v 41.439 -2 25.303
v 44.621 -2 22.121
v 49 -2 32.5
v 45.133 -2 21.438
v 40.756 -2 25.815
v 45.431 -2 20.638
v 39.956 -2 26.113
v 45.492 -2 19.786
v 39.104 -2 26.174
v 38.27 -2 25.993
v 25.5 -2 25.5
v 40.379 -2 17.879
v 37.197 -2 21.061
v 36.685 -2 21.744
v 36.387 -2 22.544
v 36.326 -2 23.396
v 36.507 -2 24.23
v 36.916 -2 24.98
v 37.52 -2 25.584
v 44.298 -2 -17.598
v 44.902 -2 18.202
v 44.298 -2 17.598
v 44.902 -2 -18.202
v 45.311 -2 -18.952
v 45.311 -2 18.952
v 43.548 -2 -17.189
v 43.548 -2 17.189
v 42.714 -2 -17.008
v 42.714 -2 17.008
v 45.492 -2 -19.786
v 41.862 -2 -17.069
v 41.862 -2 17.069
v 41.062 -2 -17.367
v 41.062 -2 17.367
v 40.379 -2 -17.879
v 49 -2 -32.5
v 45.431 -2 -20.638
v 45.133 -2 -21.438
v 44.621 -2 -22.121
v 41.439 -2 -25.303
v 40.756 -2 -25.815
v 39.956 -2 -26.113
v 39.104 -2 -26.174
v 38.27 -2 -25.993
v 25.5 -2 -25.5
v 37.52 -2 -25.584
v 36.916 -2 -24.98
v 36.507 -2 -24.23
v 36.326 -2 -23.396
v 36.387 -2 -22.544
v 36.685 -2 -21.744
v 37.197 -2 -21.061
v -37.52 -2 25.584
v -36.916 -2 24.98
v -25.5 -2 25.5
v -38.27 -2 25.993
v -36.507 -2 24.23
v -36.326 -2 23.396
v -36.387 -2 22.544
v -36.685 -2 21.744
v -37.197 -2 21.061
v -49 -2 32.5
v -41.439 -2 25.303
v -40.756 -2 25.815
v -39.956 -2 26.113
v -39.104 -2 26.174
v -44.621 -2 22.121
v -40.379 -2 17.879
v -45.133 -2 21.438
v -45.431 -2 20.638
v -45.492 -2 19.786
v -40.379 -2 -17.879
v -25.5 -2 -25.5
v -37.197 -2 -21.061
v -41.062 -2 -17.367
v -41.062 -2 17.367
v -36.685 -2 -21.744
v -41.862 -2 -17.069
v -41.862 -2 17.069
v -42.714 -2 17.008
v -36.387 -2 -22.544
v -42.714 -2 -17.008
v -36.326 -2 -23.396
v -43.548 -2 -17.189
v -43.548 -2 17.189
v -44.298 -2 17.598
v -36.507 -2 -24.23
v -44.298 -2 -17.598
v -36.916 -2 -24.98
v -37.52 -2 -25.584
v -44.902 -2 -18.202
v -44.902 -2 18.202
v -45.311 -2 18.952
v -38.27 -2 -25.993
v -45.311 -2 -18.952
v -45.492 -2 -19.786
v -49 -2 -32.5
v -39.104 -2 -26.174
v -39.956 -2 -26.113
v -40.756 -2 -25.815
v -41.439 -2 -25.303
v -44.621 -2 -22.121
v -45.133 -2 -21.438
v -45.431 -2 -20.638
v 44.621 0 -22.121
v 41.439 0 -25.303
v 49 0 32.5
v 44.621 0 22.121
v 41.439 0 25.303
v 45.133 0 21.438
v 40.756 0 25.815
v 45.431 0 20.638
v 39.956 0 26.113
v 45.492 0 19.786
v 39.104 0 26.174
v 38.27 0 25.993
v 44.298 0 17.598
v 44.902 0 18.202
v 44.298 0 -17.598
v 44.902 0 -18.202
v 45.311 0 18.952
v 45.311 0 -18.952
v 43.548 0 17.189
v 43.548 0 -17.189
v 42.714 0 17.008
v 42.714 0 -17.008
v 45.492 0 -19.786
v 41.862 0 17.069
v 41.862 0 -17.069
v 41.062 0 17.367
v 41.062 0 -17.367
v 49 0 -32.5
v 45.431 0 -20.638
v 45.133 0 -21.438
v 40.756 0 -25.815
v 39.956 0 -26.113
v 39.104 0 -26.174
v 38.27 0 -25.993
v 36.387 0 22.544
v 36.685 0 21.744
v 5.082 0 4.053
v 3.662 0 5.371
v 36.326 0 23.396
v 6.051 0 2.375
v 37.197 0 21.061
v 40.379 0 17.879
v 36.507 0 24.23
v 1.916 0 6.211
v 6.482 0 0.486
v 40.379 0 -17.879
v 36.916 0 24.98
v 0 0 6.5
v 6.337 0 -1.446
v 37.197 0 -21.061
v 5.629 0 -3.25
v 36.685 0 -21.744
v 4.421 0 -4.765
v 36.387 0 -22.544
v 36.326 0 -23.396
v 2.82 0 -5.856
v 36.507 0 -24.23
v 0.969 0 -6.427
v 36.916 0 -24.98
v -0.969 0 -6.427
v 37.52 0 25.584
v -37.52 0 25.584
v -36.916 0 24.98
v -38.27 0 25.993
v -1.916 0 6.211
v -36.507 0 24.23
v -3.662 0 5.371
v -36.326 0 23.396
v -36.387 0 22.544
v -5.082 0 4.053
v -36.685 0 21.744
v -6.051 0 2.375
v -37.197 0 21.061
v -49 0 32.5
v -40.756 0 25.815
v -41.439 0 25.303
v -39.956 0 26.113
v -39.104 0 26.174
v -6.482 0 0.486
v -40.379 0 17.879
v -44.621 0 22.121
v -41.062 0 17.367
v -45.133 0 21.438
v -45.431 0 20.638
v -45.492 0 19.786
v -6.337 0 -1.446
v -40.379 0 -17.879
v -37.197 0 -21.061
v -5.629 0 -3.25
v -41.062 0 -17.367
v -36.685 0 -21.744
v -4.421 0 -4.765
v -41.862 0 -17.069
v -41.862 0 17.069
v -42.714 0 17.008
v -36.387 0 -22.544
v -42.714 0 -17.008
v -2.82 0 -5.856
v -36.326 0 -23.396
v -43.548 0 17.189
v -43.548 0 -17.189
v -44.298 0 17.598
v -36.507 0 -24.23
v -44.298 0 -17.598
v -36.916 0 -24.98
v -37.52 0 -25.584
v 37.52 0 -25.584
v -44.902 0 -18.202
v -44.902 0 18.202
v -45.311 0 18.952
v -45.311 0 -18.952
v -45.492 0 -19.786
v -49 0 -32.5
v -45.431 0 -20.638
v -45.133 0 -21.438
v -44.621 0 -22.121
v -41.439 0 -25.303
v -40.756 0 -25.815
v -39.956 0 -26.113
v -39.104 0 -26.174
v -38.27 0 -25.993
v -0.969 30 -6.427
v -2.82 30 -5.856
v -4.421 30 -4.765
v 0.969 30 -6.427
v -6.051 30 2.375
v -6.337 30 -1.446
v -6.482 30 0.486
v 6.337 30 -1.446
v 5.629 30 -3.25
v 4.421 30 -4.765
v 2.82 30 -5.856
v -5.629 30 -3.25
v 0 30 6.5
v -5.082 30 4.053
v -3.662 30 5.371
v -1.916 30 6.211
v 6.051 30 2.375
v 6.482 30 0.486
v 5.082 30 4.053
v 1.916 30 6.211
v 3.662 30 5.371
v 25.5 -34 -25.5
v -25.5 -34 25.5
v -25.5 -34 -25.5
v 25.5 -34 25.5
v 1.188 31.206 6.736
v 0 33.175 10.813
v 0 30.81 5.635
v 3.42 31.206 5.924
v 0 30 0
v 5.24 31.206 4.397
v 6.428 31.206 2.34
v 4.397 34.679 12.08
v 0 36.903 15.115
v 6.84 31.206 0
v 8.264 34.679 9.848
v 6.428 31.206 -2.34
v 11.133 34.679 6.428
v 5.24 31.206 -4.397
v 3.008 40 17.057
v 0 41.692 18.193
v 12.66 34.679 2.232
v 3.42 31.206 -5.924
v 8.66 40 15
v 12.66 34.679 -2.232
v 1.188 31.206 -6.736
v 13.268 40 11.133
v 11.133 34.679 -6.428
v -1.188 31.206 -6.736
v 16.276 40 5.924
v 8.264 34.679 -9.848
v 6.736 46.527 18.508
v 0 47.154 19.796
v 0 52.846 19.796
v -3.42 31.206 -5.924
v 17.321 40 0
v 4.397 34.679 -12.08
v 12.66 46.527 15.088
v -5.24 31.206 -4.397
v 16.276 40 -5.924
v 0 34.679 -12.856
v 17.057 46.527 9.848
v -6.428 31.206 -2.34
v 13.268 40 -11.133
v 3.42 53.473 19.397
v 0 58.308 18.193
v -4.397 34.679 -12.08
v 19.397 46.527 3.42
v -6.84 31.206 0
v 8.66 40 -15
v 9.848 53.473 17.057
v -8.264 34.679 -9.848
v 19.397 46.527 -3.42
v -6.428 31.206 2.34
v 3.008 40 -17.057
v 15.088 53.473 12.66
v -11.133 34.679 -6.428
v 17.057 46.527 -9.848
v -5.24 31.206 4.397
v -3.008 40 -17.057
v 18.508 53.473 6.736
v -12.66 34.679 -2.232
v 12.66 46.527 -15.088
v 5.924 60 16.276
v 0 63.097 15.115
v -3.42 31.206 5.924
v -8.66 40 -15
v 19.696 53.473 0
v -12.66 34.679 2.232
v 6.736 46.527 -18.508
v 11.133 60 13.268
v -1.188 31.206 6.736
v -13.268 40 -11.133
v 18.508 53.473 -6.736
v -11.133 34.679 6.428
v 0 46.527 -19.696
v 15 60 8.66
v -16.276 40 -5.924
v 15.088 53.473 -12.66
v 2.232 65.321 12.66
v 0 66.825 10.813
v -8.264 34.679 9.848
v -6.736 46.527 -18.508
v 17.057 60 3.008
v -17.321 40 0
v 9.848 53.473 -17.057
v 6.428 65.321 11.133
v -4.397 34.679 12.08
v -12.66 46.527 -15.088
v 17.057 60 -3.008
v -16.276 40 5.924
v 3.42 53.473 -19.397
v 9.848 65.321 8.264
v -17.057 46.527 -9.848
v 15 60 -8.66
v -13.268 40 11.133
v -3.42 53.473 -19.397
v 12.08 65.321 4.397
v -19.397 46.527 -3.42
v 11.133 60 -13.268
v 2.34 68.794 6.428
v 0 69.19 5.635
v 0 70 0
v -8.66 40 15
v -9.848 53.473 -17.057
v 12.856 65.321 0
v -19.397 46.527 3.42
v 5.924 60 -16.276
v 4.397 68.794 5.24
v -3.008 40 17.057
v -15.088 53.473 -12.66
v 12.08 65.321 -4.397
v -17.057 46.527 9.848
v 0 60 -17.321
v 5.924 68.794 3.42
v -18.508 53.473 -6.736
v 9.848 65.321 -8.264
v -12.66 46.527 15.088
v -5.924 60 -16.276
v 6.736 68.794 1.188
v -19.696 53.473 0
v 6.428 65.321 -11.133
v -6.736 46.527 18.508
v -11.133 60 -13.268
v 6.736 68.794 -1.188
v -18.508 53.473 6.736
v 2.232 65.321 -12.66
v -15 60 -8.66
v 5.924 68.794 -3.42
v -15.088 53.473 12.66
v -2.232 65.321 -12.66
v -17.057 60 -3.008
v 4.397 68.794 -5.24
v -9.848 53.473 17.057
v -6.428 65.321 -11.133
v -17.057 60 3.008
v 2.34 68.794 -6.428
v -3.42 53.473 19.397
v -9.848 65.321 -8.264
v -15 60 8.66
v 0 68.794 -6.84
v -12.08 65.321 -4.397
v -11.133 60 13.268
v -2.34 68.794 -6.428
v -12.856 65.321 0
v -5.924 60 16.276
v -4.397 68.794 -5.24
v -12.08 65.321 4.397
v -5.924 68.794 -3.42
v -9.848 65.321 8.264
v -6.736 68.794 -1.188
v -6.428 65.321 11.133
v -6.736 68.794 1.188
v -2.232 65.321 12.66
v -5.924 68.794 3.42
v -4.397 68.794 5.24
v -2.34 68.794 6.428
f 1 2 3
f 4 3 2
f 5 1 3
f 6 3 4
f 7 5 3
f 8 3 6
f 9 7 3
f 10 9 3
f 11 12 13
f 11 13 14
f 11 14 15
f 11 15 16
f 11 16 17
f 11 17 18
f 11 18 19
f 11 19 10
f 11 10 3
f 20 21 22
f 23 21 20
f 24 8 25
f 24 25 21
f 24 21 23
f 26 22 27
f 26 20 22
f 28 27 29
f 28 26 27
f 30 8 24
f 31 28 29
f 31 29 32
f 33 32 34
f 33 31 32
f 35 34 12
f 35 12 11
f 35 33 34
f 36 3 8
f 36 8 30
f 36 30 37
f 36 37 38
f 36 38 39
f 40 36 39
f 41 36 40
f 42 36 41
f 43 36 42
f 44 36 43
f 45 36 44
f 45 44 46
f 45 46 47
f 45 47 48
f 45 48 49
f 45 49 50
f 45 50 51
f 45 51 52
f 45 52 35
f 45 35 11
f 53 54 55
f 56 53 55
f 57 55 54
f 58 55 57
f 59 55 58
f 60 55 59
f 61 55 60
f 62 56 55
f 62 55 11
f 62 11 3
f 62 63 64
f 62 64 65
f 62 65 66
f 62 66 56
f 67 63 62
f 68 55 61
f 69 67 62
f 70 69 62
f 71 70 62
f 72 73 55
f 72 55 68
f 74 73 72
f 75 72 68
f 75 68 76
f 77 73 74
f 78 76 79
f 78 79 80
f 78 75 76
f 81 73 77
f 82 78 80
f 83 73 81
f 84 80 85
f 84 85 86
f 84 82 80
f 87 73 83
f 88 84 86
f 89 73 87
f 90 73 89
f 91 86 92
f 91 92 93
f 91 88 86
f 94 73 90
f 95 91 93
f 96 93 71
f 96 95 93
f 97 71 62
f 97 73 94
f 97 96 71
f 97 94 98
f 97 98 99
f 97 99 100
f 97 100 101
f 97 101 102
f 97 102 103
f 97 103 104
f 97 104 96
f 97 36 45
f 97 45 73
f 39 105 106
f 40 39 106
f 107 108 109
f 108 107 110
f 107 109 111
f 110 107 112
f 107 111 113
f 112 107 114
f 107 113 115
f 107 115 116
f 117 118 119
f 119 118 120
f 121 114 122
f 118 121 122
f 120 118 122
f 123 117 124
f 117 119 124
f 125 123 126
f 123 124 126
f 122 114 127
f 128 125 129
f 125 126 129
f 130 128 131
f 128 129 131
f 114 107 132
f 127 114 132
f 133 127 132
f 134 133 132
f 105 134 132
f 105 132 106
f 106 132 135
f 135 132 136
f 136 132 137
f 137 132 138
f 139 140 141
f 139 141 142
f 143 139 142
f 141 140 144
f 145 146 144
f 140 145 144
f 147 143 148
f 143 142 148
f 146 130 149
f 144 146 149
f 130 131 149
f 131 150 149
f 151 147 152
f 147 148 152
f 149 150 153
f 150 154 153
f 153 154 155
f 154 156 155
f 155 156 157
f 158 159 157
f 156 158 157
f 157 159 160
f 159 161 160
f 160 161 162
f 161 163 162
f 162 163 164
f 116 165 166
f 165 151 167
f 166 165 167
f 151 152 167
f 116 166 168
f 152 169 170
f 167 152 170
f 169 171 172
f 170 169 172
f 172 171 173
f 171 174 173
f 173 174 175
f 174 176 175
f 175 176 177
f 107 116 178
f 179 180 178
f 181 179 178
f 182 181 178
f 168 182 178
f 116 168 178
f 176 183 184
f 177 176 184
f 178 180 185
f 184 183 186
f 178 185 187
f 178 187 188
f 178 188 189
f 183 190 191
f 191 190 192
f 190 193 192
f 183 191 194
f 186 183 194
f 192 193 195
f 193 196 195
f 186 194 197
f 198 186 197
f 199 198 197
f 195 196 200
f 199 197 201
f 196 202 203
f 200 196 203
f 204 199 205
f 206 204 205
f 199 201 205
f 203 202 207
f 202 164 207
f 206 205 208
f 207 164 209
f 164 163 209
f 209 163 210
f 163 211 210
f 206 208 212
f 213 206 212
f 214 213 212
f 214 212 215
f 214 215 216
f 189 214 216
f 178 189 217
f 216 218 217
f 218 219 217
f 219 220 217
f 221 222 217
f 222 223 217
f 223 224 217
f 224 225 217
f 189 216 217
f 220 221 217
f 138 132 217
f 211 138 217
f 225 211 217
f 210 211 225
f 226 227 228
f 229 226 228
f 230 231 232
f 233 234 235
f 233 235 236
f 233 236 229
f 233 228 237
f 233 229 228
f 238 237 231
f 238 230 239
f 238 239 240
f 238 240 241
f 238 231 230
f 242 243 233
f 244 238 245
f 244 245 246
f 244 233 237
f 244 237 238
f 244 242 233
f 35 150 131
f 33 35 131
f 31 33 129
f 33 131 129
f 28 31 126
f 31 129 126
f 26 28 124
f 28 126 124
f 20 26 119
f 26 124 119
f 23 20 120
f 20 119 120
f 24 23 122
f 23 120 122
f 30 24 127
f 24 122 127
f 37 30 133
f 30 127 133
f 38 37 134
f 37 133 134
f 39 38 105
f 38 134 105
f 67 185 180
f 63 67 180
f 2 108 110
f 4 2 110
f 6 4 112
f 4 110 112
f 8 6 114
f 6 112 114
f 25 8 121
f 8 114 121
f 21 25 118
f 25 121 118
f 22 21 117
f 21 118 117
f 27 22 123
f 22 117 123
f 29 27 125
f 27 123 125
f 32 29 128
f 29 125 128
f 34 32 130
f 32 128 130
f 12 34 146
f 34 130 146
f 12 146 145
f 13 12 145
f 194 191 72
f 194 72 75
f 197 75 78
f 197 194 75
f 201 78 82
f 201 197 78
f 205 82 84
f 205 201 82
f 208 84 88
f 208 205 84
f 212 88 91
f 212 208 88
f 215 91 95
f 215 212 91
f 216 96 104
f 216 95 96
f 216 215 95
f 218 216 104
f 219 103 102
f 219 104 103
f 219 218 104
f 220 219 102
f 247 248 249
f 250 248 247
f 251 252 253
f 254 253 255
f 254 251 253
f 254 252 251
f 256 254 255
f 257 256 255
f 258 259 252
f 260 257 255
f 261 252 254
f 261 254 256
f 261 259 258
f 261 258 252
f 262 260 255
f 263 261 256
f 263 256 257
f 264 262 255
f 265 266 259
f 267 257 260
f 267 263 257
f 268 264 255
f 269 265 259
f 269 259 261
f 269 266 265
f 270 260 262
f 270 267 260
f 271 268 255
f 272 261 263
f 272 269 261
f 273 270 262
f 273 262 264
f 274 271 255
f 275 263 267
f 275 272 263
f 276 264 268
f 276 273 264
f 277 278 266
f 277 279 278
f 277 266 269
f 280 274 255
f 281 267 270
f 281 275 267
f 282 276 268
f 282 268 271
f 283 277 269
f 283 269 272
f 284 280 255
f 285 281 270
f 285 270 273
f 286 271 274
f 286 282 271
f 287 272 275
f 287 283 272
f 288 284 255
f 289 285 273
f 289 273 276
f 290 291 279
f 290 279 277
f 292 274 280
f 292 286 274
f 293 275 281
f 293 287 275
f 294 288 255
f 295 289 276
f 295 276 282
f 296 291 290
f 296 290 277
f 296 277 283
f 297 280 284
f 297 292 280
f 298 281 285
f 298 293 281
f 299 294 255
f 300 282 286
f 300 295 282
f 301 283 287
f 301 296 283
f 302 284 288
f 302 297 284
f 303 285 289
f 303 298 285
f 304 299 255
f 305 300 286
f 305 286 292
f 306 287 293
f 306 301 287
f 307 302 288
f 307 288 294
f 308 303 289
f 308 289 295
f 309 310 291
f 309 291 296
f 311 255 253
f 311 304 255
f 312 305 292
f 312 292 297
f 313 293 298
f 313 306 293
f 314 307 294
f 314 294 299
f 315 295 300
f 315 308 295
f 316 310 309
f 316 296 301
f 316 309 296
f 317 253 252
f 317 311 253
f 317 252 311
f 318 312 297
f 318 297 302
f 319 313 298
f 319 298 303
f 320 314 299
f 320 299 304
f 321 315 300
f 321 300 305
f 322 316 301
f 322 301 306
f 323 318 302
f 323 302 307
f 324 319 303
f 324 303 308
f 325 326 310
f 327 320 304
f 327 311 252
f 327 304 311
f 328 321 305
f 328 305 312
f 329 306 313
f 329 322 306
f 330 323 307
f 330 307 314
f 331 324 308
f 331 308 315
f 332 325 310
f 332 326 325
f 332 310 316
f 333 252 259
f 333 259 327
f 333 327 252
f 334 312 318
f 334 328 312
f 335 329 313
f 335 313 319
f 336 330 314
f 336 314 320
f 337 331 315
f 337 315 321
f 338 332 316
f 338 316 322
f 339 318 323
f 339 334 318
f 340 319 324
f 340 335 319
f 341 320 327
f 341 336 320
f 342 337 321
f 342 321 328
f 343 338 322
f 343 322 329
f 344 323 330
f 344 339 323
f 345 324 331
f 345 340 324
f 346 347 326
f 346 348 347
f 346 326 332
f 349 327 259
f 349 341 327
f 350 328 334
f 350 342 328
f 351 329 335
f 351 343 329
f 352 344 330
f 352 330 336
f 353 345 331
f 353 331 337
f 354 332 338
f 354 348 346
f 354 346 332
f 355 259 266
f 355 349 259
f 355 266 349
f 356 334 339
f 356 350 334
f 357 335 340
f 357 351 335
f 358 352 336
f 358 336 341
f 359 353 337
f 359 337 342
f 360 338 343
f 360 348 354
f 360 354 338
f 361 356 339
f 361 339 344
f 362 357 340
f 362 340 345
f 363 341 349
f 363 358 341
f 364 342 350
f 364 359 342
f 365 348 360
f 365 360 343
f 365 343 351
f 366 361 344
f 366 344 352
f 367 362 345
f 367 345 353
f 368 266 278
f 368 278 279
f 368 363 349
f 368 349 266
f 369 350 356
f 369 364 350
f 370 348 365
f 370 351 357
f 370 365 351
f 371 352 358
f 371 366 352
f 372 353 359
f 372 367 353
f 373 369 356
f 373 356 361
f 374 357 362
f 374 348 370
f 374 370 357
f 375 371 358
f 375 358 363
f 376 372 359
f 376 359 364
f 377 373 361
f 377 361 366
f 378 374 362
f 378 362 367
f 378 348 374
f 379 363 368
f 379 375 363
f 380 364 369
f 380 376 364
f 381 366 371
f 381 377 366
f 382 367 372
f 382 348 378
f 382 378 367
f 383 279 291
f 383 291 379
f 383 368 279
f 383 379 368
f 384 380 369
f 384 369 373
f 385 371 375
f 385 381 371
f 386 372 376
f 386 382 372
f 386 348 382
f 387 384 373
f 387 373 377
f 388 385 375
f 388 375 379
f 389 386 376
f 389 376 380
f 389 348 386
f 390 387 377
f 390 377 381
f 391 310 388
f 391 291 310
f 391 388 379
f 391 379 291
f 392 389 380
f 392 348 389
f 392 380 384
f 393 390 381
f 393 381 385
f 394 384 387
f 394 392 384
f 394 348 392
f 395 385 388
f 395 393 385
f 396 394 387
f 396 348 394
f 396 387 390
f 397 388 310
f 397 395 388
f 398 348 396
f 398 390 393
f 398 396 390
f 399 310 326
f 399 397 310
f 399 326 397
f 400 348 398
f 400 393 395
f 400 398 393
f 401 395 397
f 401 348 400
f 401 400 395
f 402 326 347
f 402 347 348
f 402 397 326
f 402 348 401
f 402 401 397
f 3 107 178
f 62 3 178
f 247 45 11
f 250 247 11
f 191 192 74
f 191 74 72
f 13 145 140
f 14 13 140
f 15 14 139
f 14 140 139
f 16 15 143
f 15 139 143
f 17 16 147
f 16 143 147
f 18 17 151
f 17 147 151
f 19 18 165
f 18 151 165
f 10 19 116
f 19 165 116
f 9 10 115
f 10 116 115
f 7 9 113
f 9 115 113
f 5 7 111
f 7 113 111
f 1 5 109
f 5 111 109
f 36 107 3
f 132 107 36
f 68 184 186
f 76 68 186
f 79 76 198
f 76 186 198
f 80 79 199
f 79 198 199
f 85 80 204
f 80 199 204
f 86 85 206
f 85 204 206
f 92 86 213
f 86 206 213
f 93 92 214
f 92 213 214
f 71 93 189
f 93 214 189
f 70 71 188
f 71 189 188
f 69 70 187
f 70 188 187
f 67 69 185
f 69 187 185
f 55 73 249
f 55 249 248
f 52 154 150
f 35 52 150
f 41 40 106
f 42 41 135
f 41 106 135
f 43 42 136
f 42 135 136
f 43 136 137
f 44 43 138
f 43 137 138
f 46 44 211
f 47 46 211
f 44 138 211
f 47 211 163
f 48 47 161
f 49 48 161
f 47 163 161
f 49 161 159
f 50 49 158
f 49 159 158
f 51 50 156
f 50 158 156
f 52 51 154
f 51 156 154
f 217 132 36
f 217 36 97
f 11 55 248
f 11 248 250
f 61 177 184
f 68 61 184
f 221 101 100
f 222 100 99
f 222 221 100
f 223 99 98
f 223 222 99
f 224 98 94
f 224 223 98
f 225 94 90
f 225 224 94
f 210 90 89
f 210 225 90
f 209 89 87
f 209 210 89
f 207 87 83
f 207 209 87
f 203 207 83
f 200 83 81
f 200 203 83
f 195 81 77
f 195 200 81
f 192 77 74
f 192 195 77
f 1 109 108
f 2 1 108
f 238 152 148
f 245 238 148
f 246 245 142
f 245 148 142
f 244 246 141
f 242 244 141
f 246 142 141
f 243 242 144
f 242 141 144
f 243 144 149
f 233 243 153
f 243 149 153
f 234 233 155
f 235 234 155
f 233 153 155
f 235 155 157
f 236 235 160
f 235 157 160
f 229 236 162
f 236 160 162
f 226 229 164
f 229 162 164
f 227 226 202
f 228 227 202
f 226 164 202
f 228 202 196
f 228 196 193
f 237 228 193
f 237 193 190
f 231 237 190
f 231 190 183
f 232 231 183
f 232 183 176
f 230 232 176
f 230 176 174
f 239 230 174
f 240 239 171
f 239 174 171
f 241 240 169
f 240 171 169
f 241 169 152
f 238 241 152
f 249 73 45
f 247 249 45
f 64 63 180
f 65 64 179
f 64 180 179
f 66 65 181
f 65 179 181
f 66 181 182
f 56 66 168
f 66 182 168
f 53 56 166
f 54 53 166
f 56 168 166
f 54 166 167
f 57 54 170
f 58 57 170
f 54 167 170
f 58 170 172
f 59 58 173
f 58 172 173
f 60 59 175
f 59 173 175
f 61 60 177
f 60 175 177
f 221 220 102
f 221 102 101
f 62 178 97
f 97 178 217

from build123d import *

# Parameters (mm, degrees)
SKETCH3_R           = 6.5
BOSS_EXTRUDE2_DEPTH = 30
SKETCH4_W           = 98
SKETCH4_H           = 65
BOSS_EXTRUDE3_DEPTH = 2
SKETCH5_W           = 51
SKETCH5_H           = 51
BOSS_EXTRUDE4_DEPTH = 32
CUT_EXTRUDE1_DEPTH  = 68.920909888


with BuildPart() as part:
    # Sketch3 → Boss-Extrude2 (new body)
    with BuildSketch(Plane(origin=(0, 0, 0), x_dir=(1, 0, 0), z_dir=(0, 1, 0))):
        with Locations(Location((0, 0, 0), (0, 0, 270))):
            Circle(SKETCH3_R)
    extrude(amount=BOSS_EXTRUDE2_DEPTH)

    # Sketch4 → Boss-Extrude3 (add)
    with BuildSketch(Plane(origin=(0, 0, 0), x_dir=(-1, 0, 0), z_dir=(0, -1, 0))):
        Rectangle(SKETCH4_W, SKETCH4_H)
    extrude(amount=BOSS_EXTRUDE3_DEPTH)

    # Sketch5 → Boss-Extrude4 (add)
    with BuildSketch(Plane.XZ.offset(2)):
        Rectangle(SKETCH5_W, SKETCH5_H)
    extrude(amount=BOSS_EXTRUDE4_DEPTH)

    # Sketch7 → Cut-Extrude1 (cut, through all)
    with BuildSketch(Plane(origin=(0, 0, 0), x_dir=(1, 0, 0), z_dir=(0, 1, 0))):
        with BuildLine():
            Line((-44.621320344, 22.121320344), (-41.439339828, 25.303300859))
            ThreePointArc((-41.439339828, 25.303300859), (-37.196699141, 25.303300859), (-37.196699141, 21.060660172))
            Line((-37.196699141, 21.060660172), (-40.378679656, 17.878679656))
            ThreePointArc((-40.378679656, 17.878679656), (-44.621320344, 17.878679656), (-44.621320344, 22.121320344))
        make_face()
        with BuildLine():
            Line((-44.621320344, -22.121320344), (-41.439339828, -25.303300859))
            ThreePointArc((-41.439339828, -25.303300859), (-37.196699141, -25.303300859), (-37.196699141, -21.060660172))
            Line((-37.196699141, -21.060660172), (-40.378679656, -17.878679656))
            ThreePointArc((-40.378679656, -17.878679656), (-44.621320344, -17.878679656), (-44.621320344, -22.121320344))
        make_face()
        with BuildLine():
            Line((40.378679656, -17.878679656), (37.196699141, -21.060660172))
            ThreePointArc((37.196699141, -21.060660172), (37.196699141, -25.303300859), (41.439339828, -25.303300859))
            Line((41.439339828, -25.303300859), (44.621320344, -22.121320344))
            ThreePointArc((44.621320344, -22.121320344), (44.621320344, -17.878679656), (40.378679656, -17.878679656))
        make_face()
        with BuildLine():
            Line((44.621320344, 22.121320344), (41.439339828, 25.303300859))
            ThreePointArc((41.439339828, 25.303300859), (37.196699141, 25.303300859), (37.196699141, 21.060660172))
            Line((37.196699141, 21.060660172), (40.378679656, 17.878679656))
            ThreePointArc((40.378679656, 17.878679656), (44.621320344, 17.878679656), (44.621320344, 22.121320344))
        make_face()
    extrude(amount=-CUT_EXTRUDE1_DEPTH, mode=Mode.SUBTRACT)


with BuildPart() as body_2:
    # 3DSketch1 → Revolve3 (revolve)
    with BuildSketch(Plane(origin=(0, 70, 0), x_dir=(0, -1, 0), z_dir=(-1, 0, 0))):
        with BuildLine():
            Line((0, 0), (40, 0))
            ThreePointArc((40, 0), (20, 20), (0, 0))
        make_face()
    revolve(axis=Axis((0, 30, 0), (0, 1, 0)))


solid = Compound([part.part, body_2.part])
